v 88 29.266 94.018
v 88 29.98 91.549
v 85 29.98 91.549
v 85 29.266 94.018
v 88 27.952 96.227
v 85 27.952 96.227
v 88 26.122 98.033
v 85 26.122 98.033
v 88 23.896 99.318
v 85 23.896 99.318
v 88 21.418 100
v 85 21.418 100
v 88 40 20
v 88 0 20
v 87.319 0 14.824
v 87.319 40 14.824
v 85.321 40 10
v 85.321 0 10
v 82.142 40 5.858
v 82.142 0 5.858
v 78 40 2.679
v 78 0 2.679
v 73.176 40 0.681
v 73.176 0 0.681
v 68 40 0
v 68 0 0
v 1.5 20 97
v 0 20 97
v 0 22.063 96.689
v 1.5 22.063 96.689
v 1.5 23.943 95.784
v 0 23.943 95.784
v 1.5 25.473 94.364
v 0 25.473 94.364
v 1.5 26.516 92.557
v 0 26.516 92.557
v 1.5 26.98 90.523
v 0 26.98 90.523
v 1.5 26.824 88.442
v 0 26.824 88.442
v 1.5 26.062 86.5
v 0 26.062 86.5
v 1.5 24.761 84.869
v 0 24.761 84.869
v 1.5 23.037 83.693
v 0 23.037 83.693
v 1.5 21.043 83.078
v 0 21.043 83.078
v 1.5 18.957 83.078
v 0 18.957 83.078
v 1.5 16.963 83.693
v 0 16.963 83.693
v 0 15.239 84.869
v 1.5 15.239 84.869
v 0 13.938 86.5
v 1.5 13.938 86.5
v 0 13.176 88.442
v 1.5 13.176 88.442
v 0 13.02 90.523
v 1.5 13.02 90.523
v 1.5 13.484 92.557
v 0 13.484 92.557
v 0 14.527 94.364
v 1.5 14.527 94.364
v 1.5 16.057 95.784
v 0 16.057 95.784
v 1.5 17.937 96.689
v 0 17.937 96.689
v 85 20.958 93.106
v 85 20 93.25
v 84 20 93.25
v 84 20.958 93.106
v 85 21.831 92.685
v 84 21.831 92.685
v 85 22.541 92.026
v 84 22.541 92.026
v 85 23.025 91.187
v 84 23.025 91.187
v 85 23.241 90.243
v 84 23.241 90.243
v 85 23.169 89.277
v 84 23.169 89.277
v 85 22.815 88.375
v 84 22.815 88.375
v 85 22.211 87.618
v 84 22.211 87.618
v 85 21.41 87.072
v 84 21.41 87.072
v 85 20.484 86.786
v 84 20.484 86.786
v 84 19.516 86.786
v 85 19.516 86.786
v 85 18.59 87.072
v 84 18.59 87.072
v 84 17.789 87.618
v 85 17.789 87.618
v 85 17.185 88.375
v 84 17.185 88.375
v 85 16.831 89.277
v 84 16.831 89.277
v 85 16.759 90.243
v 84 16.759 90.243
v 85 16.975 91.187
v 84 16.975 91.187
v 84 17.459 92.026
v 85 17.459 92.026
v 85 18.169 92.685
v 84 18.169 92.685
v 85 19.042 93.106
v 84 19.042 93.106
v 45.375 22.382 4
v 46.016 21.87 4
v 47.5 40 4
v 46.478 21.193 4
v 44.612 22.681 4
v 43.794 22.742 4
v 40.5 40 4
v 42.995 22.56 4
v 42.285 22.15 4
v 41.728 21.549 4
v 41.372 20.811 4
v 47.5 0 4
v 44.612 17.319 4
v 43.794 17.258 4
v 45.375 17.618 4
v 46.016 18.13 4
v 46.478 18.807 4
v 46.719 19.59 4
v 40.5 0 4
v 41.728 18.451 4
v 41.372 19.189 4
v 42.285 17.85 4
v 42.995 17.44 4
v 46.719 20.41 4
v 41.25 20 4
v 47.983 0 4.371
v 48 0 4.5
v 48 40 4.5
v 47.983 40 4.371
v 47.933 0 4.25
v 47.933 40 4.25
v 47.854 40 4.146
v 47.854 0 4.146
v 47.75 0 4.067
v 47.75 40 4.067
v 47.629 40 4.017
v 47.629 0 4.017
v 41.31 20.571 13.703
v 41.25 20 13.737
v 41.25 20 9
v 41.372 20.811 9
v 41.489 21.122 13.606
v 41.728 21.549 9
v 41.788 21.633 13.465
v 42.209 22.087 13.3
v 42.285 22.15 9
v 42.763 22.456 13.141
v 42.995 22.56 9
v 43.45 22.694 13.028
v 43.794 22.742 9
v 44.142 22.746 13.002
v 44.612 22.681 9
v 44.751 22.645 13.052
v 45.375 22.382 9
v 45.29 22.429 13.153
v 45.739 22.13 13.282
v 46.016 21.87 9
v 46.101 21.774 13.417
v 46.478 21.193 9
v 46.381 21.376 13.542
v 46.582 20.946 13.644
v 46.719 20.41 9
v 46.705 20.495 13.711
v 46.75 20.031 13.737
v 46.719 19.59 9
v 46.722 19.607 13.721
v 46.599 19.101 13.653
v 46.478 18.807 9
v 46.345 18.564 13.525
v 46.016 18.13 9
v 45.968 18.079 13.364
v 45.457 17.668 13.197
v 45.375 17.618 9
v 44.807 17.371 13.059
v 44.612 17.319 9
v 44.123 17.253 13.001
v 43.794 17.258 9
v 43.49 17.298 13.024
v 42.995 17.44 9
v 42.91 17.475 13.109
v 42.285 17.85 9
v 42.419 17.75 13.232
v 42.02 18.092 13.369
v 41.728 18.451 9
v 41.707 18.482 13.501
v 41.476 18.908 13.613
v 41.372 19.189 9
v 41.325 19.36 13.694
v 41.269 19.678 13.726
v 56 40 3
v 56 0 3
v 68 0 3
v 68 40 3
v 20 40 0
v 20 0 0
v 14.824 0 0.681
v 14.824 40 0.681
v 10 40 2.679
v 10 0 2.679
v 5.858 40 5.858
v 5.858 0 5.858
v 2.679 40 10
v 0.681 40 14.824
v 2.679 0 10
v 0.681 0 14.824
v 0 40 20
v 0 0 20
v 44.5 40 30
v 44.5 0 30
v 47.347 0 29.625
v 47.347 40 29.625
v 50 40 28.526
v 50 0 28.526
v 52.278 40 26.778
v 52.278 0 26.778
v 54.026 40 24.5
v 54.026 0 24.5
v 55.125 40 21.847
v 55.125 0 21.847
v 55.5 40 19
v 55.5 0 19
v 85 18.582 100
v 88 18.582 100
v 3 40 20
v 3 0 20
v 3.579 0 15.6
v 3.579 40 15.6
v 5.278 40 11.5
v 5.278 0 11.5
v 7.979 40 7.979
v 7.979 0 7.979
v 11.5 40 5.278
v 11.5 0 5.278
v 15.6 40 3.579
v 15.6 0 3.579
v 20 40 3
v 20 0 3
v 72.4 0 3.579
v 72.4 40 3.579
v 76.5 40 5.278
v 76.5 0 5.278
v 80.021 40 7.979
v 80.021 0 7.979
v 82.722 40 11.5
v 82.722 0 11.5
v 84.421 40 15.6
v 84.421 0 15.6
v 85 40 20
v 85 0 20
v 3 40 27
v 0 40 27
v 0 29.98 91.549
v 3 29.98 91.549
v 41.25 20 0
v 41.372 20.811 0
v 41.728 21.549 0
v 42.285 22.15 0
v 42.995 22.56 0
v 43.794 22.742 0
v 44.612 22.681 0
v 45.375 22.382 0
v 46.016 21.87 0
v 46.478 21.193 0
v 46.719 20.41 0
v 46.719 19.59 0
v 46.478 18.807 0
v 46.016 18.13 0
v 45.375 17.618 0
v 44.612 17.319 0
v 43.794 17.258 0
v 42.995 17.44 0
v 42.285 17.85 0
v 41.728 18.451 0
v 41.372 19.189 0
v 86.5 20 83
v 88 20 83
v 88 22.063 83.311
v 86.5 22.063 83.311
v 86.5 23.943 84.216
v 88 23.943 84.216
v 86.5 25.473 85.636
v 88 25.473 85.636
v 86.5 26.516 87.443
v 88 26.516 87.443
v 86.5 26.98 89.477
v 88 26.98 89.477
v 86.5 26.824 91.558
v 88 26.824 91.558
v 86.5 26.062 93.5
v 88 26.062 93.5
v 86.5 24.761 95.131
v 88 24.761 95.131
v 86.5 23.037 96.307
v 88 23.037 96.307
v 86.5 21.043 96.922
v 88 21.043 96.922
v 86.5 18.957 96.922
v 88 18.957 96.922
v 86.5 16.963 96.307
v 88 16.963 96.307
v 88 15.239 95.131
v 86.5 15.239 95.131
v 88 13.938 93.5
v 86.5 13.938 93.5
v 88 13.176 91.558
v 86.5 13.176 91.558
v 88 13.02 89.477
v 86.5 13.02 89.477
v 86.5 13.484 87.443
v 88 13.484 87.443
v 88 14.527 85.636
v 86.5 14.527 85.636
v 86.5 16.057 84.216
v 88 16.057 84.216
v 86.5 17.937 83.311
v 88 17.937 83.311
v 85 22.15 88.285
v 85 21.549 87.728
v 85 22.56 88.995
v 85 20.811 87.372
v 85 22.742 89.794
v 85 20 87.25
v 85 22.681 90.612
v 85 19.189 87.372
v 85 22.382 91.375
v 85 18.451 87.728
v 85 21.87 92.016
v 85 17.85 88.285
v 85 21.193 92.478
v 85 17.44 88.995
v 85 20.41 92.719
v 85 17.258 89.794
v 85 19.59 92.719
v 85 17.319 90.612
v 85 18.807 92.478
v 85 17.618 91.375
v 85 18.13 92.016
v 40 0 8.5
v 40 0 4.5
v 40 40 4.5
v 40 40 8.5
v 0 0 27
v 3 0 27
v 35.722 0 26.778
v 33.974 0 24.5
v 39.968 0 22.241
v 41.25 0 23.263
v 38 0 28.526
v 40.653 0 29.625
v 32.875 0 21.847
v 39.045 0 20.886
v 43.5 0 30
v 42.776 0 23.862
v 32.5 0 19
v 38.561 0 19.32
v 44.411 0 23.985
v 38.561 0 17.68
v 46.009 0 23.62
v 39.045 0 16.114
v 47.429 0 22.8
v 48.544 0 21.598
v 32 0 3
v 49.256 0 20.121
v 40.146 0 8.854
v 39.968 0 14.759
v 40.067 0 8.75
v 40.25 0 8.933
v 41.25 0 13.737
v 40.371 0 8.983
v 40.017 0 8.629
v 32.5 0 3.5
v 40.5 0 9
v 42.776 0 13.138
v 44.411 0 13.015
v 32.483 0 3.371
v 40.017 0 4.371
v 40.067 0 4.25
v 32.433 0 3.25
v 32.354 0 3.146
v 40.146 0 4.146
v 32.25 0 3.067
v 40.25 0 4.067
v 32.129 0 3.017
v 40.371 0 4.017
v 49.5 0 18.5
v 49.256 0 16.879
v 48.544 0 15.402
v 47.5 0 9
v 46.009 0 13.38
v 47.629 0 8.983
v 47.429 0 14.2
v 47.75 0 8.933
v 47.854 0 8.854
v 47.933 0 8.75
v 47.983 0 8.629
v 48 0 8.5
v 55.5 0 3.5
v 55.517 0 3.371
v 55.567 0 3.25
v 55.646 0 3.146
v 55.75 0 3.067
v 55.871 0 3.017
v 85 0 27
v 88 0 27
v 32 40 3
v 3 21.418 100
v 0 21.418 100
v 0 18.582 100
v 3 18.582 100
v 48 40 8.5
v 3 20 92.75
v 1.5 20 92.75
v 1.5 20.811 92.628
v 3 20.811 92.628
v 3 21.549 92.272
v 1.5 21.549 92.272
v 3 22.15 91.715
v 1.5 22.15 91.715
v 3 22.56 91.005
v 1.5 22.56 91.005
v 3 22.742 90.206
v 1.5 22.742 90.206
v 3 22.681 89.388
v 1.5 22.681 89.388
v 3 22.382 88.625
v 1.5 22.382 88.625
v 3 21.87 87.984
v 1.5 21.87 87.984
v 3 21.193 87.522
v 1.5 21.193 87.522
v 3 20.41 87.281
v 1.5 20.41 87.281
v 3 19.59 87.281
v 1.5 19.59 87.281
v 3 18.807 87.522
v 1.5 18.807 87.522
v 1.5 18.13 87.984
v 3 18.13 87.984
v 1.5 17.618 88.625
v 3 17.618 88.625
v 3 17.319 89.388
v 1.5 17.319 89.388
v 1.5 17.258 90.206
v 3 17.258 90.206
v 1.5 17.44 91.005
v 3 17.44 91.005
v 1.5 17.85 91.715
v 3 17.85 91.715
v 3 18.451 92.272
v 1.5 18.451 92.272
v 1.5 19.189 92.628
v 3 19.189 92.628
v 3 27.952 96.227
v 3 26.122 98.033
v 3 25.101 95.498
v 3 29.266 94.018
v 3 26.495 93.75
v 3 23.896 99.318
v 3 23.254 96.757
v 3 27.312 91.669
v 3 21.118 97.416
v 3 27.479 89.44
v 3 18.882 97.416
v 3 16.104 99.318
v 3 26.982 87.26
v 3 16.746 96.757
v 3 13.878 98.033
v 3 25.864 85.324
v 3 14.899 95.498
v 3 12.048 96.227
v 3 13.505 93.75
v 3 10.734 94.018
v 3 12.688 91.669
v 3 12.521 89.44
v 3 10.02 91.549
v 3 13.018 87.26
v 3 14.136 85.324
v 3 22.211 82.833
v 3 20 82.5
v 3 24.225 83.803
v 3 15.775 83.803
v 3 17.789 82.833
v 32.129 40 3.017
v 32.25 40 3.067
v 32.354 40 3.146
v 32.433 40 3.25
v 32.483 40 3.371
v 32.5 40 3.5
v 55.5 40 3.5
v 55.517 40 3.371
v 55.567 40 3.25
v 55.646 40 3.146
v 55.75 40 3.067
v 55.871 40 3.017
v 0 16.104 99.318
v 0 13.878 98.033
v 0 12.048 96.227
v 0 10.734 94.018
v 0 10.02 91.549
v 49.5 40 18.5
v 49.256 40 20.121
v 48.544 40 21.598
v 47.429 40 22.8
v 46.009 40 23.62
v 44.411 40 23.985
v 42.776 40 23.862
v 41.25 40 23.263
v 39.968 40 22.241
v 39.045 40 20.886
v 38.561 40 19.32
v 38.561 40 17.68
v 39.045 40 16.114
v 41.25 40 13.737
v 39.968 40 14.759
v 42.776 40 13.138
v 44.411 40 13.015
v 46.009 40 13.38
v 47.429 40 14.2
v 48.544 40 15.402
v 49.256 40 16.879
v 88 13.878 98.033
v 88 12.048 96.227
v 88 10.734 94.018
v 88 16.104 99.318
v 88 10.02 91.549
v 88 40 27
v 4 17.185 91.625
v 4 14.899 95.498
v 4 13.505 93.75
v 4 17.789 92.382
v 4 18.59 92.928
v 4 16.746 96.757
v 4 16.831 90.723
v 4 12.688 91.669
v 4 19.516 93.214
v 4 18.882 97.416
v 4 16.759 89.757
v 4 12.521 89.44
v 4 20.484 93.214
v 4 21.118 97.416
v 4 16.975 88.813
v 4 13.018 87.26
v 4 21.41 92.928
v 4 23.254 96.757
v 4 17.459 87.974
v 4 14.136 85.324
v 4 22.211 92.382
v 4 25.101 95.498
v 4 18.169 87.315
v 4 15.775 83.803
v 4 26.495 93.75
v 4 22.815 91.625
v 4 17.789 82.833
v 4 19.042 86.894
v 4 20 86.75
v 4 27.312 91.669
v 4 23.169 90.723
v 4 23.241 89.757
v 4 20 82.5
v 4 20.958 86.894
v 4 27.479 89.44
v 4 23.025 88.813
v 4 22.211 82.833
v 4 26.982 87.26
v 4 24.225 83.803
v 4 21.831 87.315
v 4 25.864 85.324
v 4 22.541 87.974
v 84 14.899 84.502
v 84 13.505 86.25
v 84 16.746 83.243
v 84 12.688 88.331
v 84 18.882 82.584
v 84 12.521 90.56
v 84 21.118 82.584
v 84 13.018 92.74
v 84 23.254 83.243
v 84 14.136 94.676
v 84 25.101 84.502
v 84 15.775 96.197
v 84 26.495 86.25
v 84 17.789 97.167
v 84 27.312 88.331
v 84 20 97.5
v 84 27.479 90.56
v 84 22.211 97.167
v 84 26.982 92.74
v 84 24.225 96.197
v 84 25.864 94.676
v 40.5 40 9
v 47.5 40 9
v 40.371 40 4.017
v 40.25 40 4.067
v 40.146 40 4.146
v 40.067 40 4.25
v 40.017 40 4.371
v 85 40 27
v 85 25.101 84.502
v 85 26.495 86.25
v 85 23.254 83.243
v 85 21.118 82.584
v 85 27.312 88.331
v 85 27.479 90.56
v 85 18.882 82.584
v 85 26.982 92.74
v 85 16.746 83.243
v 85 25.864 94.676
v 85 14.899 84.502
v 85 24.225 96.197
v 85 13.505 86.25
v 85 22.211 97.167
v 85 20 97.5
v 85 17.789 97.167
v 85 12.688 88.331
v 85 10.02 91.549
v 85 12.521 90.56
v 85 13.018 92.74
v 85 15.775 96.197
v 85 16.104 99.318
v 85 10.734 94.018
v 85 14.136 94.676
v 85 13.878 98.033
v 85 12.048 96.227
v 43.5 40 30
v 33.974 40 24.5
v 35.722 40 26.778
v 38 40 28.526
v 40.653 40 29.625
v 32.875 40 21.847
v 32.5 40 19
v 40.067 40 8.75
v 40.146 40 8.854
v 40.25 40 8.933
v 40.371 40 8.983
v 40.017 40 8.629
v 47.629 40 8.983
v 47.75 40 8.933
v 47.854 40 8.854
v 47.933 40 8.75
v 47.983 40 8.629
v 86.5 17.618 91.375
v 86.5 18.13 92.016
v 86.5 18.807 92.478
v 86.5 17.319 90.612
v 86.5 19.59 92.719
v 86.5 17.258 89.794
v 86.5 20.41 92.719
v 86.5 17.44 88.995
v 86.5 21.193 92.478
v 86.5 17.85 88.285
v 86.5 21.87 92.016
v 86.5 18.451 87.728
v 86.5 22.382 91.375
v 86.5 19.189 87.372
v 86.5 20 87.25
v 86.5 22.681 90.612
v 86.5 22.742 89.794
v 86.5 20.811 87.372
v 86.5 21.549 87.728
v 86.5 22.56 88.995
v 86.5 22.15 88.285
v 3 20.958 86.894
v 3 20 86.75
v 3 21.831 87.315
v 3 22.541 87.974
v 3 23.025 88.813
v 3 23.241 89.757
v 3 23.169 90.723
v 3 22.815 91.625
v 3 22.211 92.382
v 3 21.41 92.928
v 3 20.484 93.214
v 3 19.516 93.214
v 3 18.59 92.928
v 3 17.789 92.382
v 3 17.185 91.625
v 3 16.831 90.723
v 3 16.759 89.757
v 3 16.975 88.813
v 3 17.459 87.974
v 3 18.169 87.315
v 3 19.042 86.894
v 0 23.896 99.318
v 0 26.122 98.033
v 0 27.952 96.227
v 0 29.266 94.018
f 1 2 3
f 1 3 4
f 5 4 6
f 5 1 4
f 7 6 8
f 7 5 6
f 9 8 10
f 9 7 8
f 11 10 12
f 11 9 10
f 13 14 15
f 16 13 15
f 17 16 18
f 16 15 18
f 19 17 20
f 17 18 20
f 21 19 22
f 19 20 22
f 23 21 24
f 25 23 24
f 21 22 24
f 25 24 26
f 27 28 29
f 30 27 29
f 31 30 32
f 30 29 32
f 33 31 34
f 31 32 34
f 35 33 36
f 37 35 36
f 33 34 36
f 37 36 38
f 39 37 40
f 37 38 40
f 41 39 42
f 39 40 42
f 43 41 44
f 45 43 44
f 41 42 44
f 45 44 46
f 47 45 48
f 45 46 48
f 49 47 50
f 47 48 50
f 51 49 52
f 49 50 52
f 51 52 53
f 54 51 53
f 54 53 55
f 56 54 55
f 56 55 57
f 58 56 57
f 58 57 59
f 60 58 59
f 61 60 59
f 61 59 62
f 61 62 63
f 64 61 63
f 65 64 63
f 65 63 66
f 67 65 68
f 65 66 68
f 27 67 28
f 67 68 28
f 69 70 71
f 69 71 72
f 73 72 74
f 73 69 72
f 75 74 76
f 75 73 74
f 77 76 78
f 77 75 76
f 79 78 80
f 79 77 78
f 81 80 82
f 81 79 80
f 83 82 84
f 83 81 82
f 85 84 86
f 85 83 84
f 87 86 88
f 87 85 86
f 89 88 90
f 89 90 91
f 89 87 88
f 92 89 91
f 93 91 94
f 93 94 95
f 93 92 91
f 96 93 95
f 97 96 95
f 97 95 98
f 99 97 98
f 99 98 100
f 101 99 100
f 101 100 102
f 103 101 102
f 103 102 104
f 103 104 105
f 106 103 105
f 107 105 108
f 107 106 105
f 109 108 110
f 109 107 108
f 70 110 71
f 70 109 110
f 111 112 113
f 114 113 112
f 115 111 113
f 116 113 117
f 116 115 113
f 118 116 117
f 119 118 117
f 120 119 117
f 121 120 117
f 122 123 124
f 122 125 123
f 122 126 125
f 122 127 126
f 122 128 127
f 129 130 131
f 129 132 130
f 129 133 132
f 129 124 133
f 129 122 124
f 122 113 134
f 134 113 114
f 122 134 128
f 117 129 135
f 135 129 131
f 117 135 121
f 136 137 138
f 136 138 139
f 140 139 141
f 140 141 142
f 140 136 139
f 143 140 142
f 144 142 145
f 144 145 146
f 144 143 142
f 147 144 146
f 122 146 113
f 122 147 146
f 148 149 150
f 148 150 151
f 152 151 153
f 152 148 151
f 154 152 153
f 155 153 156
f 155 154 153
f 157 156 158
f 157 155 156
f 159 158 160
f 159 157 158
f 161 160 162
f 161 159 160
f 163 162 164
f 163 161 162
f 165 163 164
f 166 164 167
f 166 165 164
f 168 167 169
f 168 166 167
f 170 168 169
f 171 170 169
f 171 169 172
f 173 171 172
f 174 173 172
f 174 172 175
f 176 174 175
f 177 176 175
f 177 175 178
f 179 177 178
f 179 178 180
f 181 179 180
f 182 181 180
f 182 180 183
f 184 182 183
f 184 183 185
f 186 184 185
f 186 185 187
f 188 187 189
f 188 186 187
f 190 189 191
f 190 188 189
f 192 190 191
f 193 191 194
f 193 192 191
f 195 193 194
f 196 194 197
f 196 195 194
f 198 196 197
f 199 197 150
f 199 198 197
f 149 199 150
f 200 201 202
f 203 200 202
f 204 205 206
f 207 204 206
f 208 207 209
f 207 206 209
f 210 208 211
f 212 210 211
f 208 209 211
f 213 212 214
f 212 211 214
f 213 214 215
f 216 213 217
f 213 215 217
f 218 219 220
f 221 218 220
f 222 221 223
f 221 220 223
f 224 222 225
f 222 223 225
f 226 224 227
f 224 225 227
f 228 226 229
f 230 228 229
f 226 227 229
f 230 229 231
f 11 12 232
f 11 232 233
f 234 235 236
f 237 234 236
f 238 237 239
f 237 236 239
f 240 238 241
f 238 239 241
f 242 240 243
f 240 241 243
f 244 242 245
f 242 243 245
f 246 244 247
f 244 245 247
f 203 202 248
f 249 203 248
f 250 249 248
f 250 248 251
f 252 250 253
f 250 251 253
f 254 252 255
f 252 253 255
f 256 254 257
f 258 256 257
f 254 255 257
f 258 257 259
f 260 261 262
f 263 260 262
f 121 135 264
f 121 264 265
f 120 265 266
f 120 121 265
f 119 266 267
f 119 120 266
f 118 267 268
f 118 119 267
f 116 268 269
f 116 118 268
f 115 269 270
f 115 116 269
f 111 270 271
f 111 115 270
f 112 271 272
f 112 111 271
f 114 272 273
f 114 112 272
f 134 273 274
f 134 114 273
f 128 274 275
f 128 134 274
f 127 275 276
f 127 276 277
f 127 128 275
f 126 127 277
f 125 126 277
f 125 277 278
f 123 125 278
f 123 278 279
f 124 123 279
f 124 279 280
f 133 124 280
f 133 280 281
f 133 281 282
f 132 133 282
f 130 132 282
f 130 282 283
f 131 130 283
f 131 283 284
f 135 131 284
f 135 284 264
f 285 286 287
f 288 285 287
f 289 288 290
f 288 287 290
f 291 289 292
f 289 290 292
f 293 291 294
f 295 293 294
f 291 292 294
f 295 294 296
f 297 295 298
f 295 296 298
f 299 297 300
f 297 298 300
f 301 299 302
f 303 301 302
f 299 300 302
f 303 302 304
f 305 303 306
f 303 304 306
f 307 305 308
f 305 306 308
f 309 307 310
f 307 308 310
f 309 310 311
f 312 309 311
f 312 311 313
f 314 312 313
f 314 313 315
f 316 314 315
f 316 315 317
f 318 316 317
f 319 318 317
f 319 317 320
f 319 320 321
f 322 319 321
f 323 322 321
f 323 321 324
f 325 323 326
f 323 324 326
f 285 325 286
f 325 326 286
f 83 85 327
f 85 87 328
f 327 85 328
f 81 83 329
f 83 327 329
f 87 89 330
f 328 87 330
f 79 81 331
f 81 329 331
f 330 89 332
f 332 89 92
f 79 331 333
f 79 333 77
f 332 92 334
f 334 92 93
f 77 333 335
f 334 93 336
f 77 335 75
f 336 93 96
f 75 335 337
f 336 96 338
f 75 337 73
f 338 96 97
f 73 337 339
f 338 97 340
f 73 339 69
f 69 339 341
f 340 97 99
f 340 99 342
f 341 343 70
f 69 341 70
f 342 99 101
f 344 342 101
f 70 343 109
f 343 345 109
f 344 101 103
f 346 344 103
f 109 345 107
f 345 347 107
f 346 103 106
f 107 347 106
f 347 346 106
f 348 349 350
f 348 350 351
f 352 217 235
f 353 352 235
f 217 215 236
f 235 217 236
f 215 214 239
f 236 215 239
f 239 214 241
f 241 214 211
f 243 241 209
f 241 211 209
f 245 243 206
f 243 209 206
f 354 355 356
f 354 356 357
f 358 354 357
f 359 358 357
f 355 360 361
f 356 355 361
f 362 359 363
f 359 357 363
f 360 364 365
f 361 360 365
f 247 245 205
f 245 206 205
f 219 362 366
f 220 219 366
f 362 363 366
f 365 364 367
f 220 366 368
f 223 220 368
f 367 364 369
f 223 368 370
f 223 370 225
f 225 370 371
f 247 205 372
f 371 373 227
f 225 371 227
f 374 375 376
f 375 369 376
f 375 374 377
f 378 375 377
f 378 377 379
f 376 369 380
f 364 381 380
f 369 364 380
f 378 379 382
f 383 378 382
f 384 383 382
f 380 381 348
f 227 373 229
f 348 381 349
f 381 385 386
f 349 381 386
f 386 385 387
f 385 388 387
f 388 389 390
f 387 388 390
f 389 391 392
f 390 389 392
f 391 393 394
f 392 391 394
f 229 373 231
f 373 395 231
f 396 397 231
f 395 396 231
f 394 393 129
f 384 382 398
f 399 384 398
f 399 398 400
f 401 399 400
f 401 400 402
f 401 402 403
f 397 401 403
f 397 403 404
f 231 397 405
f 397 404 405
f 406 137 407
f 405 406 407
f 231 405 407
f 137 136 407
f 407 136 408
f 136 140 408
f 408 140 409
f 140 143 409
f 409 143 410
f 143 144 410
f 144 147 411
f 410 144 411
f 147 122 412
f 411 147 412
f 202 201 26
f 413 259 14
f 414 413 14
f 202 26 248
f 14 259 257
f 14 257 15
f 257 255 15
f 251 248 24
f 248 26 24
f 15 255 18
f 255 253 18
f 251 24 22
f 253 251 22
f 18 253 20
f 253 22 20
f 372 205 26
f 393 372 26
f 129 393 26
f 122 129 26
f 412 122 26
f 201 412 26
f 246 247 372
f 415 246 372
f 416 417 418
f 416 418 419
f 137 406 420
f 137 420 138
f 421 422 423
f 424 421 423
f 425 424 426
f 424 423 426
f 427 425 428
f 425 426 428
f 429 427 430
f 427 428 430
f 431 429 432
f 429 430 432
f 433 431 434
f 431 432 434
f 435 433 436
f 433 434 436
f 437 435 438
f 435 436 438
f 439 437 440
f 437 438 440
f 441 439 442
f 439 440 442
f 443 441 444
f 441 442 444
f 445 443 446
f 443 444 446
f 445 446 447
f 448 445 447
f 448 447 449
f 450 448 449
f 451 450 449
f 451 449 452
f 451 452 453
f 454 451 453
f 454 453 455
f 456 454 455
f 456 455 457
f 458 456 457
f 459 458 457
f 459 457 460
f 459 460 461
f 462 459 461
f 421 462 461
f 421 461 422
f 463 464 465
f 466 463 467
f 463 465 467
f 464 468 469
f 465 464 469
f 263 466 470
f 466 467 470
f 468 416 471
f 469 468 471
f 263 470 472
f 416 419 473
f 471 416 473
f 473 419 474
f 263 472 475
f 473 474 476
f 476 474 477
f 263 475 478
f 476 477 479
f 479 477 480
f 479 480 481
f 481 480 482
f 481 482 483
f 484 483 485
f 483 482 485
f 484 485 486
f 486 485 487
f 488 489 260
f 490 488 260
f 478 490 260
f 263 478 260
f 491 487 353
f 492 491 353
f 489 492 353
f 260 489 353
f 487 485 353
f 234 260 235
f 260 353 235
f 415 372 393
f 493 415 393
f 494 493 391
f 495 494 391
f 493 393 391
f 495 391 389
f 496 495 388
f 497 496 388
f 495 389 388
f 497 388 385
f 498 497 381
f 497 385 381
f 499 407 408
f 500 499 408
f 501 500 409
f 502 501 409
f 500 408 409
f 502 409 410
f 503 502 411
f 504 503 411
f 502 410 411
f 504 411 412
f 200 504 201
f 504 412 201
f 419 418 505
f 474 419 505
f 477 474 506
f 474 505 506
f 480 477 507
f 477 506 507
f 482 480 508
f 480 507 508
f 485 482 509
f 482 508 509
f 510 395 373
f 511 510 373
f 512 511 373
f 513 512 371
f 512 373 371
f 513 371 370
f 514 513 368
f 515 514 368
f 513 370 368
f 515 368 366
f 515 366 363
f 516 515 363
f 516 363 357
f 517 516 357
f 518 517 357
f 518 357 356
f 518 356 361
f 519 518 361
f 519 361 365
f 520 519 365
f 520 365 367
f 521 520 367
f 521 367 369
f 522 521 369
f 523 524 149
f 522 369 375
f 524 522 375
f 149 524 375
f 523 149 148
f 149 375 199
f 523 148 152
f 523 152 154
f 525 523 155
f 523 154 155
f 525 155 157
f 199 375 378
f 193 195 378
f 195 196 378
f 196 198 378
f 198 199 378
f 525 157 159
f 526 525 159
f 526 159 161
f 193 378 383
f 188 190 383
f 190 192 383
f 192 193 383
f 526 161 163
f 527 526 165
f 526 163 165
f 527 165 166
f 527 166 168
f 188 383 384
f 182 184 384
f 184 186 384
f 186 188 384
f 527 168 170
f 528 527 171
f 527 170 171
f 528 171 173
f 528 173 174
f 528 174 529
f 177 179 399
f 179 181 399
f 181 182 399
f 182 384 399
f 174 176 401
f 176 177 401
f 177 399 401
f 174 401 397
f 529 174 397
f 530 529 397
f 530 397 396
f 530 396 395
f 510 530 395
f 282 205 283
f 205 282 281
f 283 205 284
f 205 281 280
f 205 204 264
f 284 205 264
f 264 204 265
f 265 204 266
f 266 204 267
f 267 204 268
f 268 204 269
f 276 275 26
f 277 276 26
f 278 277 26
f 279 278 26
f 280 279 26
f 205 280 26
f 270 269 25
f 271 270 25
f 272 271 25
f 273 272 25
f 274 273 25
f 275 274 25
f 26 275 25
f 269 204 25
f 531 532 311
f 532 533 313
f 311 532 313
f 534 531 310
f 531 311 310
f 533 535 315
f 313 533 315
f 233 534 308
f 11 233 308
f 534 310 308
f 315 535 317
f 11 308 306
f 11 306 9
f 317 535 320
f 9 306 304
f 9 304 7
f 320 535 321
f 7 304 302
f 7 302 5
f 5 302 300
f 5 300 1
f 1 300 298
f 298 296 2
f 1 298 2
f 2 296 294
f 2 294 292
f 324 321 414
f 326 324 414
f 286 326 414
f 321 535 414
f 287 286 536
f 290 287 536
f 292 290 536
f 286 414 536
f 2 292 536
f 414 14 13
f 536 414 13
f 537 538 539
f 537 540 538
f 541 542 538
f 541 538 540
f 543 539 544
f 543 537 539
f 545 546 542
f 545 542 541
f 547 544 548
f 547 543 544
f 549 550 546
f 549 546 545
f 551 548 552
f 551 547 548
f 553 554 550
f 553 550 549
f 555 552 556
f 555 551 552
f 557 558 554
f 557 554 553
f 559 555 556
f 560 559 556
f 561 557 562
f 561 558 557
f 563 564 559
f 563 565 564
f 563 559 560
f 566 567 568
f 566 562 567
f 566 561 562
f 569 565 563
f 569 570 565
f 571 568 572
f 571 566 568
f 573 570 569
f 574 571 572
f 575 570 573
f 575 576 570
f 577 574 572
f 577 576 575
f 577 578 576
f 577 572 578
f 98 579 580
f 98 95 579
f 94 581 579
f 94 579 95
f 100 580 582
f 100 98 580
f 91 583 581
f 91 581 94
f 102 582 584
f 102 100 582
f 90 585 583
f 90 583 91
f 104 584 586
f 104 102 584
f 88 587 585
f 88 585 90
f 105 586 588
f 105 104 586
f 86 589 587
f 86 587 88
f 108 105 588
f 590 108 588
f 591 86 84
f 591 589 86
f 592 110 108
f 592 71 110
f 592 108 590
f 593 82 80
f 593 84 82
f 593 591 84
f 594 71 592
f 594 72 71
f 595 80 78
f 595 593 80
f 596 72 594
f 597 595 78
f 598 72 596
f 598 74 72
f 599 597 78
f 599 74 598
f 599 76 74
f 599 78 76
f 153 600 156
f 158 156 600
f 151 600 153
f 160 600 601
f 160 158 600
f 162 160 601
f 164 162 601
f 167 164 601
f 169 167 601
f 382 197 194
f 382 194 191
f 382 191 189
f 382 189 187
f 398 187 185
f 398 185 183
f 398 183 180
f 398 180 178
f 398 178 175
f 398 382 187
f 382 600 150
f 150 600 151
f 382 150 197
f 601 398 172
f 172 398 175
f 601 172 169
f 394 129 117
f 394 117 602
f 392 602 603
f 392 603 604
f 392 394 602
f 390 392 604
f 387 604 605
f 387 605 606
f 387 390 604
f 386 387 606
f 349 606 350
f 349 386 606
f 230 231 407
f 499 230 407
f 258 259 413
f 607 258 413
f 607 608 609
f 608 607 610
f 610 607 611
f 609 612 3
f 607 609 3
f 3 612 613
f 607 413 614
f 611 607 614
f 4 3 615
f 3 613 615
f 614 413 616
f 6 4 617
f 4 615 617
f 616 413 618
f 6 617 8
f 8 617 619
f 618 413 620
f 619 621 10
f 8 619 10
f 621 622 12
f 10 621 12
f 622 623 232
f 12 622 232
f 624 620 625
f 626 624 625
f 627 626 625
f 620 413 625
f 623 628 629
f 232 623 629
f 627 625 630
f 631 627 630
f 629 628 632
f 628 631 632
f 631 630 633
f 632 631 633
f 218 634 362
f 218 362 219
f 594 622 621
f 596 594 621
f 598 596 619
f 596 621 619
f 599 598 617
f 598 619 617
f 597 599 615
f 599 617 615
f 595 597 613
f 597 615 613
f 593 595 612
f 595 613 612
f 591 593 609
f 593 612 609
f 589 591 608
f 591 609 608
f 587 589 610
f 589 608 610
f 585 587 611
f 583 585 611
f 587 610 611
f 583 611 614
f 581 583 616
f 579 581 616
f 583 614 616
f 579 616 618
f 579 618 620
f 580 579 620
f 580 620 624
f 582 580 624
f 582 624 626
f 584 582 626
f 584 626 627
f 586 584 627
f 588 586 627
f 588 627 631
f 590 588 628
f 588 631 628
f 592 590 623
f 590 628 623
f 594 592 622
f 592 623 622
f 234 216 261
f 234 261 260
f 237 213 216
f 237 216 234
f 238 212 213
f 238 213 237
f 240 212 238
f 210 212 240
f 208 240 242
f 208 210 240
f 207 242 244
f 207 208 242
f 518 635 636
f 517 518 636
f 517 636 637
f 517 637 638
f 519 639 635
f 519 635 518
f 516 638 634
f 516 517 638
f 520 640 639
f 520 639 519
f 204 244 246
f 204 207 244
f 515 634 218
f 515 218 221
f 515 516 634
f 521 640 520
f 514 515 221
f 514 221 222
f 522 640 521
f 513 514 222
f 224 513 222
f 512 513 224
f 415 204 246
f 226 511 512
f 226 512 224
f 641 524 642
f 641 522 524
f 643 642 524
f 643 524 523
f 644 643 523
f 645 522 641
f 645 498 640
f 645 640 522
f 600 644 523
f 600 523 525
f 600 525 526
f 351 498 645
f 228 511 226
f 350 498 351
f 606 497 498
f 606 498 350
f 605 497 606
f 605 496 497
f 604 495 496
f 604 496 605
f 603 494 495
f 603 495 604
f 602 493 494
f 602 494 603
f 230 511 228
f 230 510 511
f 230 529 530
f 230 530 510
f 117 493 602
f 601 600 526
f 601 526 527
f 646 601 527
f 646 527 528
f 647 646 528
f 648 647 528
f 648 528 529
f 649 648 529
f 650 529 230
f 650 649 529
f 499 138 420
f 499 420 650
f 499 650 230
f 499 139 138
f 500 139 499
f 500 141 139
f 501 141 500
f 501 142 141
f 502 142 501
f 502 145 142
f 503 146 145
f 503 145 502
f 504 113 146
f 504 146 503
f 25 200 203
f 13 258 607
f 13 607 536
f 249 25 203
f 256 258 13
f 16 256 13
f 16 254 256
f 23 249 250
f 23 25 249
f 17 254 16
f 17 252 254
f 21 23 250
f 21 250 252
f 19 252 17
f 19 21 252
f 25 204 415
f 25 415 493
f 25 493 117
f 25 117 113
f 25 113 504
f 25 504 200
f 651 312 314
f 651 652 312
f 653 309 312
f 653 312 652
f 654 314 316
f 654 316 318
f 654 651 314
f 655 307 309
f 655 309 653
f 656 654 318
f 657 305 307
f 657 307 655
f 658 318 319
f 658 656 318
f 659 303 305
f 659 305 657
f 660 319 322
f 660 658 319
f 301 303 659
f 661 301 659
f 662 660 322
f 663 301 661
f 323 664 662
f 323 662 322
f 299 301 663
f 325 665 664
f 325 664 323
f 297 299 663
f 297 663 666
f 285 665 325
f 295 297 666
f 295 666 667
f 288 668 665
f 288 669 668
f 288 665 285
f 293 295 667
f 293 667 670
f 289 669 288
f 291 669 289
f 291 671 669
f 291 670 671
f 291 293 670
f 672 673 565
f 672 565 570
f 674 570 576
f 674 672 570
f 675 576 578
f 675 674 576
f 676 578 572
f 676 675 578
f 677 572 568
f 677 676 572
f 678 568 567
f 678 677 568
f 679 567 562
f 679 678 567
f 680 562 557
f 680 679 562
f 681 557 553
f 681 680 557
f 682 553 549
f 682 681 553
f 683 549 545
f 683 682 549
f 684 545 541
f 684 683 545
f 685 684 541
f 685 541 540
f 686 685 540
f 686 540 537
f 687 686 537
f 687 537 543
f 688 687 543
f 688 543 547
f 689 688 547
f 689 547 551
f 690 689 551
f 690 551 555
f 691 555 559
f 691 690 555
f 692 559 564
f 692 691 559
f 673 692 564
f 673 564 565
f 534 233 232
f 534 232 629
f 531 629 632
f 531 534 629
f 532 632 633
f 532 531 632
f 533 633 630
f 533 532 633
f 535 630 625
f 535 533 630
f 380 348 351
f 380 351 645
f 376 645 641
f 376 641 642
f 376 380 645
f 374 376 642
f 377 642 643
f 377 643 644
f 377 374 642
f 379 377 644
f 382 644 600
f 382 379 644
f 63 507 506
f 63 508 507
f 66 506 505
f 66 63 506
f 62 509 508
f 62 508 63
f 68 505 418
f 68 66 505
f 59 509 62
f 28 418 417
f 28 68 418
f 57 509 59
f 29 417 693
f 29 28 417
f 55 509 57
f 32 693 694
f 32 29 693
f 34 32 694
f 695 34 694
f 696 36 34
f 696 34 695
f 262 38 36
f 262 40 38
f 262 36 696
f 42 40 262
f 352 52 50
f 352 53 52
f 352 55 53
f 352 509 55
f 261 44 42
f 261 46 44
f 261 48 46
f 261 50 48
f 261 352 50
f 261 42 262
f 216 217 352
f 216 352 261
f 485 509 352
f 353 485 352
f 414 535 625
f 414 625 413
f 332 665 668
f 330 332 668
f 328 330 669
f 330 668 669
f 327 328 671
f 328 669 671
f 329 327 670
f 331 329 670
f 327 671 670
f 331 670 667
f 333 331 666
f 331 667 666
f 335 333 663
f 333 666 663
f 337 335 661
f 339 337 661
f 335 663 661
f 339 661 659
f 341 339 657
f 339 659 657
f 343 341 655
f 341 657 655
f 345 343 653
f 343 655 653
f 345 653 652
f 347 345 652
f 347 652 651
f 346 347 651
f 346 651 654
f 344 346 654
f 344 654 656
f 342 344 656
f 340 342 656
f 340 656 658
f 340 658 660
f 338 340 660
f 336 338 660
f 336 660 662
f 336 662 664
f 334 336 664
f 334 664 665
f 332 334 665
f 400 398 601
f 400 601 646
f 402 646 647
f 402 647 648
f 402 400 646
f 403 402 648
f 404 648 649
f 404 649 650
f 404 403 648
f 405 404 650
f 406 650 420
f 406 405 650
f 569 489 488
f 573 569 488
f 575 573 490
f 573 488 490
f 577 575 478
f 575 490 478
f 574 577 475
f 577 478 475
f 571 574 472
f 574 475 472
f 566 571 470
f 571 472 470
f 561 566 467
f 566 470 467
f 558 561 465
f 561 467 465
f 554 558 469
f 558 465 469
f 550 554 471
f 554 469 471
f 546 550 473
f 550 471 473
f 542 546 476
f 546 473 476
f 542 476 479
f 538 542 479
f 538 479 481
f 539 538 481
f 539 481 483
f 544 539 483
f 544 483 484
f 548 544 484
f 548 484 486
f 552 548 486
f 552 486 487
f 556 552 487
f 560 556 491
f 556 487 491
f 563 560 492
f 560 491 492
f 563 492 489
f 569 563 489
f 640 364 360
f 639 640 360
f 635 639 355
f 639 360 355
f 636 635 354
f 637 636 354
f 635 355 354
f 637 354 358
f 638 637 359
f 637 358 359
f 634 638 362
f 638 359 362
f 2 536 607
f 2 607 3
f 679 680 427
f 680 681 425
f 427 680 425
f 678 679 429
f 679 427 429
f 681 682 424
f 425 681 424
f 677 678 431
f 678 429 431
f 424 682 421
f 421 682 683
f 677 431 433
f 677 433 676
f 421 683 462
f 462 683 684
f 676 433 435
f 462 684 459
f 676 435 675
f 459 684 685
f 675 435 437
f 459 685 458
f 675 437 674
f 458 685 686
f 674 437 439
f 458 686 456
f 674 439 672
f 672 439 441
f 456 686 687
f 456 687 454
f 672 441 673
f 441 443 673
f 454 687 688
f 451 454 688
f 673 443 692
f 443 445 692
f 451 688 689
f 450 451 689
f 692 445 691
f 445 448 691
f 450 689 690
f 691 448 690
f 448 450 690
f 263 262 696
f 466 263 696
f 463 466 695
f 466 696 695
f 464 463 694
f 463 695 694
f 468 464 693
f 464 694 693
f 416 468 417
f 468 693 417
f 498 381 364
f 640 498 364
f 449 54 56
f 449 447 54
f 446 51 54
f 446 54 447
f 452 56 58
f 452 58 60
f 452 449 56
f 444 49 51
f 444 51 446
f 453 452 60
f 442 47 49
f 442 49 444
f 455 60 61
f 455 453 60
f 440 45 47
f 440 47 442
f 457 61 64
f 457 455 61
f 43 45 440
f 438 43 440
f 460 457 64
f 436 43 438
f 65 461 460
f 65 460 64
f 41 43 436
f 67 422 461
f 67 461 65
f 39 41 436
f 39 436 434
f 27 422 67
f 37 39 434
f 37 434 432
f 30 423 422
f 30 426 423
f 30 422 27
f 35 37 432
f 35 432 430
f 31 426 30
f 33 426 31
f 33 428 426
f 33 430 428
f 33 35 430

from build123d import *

# Parameters (mm, degrees)
SKETCH1_W           = 88
SKETCH1_H           = 40
BOSS_EXTRUDE1_DEPTH = 100
SKETCH2_R           = 5.5
CUT_EXTRUDE1_DEPTH  = 40
CUT_EXTRUDE2_START  = -13.73686
SKETCH3_R           = 2.75
CUT_EXTRUDE2_DEPTH  = 13.73686
SKETCH5_R           = 2.75
CUT_EXTRUDE3_DEPTH  = 3
SKETCH6_R           = 2.75
CUT_EXTRUDE4_DEPTH  = 3
SKETCH7_R           = 7.5
SKETCH7_R_2         = 3.25
BOSS_EXTRUDE2_DEPTH = 1
SKETCH8_R           = 7.5
SKETCH8_R_2         = 3.25
BOSS_EXTRUDE3_DEPTH = 1
SKETCH9_R           = 7
CUT_EXTRUDE5_DEPTH  = 1.5
SKETCH10_R          = 7
CUT_EXTRUDE6_DEPTH  = 1.5


with BuildPart() as part:
    # Sketch1 → Boss-Extrude1 (new body)
    with BuildSketch(Plane.XY):
        with Locations((44, 20)):
            Rectangle(SKETCH1_W, SKETCH1_H)
    extrude(amount=BOSS_EXTRUDE1_DEPTH)

    # Sketch2 → Cut-Extrude1 (cut)
    with BuildSketch(Plane.XZ):
        with Locations((44, 18.5)):
            Circle(SKETCH2_R)
        with BuildLine():
            Line((20, 3), (32, 3))
            ThreePointArc((32, 3), (32.353553391, 3.146446609), (32.5, 3.5))
            Line((32.5, 3.5), (32.5, 19))
            ThreePointArc((32.5, 19), (35.721825407, 26.778174593), (43.5, 30))
            Line((43.5, 30), (44.5, 30))
            ThreePointArc((44.5, 30), (52.278174593, 26.778174593), (55.5, 19))
            Line((55.5, 19), (55.5, 3.5))
            ThreePointArc((55.5, 3.5), (55.646446609, 3.146446609), (56, 3))
            Line((56, 3), (68, 3))
            ThreePointArc((68, 3), (80.02081528, 7.97918472), (85, 20))
            Line((85, 20), (85, 100))
            Line((85, 100), (3, 100))
            Line((3, 100), (3, 20))
            ThreePointArc((3, 20), (7.97918472, 7.97918472), (20, 3))
        make_face()
        with BuildLine():
            Line((0, 20), (0, 0))
            Line((0, 0), (20, 0))
            ThreePointArc((20, 0), (5.857864376, 5.857864376), (0, 20))
        make_face()
        with BuildLine():
            Line((68, 0), (88, 0))
            Line((88, 0), (88, 20))
            ThreePointArc((88, 20), (82.142135624, 5.857864376), (68, 0))
        make_face()
        with BuildLine():
            Line((40.5, 9), (47.5, 9))
            ThreePointArc((47.5, 9), (47.853553391, 8.853553391), (48, 8.5))
            Line((48, 8.5), (48, 4.5))
            ThreePointArc((48, 4.5), (47.853553391, 4.146446609), (47.5, 4))
            Line((47.5, 4), (40.5, 4))
            ThreePointArc((40.5, 4), (40.146446609, 4.146446609), (40, 4.5))
            Line((40, 4.5), (40, 8.5))
            ThreePointArc((40, 8.5), (40.146446609, 8.853553391), (40.5, 9))
        make_face()
    extrude(amount=-CUT_EXTRUDE1_DEPTH, mode=Mode.SUBTRACT)

    # Sketch3 → Cut-Extrude2 (cut)
    with BuildSketch(Plane(origin=(0, 0, 0), x_dir=(-1, 0, 0), z_dir=(0, 0, -1)).offset(CUT_EXTRUDE2_START)):
        with Locations((-44, 20)):
            Circle(SKETCH3_R)
    extrude(amount=CUT_EXTRUDE2_DEPTH, mode=Mode.SUBTRACT)

    # Sketch5 → Cut-Extrude3 (cut)
    with BuildSketch(Plane(origin=(88, 0, 0), x_dir=(0, 0, -1), z_dir=(1, 0, 0))):
        with Locations((-90, 20)):
            Circle(SKETCH5_R)
        with BuildLine():
            Line((-27, 0), (-100, 0))
            Line((-100, 0), (-100, 18.582255312))
            ThreePointArc((-100, 18.582255312), (-97.188609996, 12.905362143), (-91.549199975, 10.01952008))
            Line((-91.549199975, 10.01952008), (-27, 0))
        make_face()
        with BuildLine():
            Line((-100, 40), (-27, 40))
            Line((-27, 40), (-91.549199975, 29.98047992))
            ThreePointArc((-91.549199975, 29.98047992), (-97.188609996, 27.094637857), (-100, 21.417744688))
            Line((-100, 21.417744688), (-100, 40))
        make_face()
    extrude(amount=-CUT_EXTRUDE3_DEPTH, mode=Mode.SUBTRACT)

    # Sketch6 → Cut-Extrude4 (cut)
    with BuildSketch(Plane.ZY):
        with Locations((90, 20)):
            Circle(SKETCH6_R)
        with BuildLine():
            Line((100, 0), (100, 18.582255312))
            ThreePointArc((100, 18.582255312), (97.188609996, 12.905362143), (91.549199975, 10.01952008))
            Line((91.549199975, 10.01952008), (27, 0))
            Line((27, 0), (100, 0))
        make_face()
        with BuildLine():
            Line((100, 21.417744688), (100, 40))
            Line((100, 40), (27, 40))
            Line((27, 40), (91.549199975, 29.98047992))
            ThreePointArc((91.549199975, 29.98047992), (97.188609996, 27.094637857), (100, 21.417744688))
        make_face()
    extrude(amount=-CUT_EXTRUDE4_DEPTH, mode=Mode.SUBTRACT)

    # Sketch7 → Boss-Extrude2 (add)
    with BuildSketch(Plane(origin=(3, 0, 0), x_dir=(0, 0, -1), z_dir=(1, 0, 0))):
        with Locations((-90, 20)):
            Circle(SKETCH7_R)
        with Locations((-90, 20)):
            Circle(SKETCH7_R_2, mode=Mode.SUBTRACT)
    extrude(amount=BOSS_EXTRUDE2_DEPTH)

    # Sketch8 → Boss-Extrude3 (add)
    with BuildSketch(Plane.ZY.offset(-85)):
        with Locations((90, 20)):
            Circle(SKETCH8_R)
        with Locations((90, 20)):
            Circle(SKETCH8_R_2, mode=Mode.SUBTRACT)
    extrude(amount=BOSS_EXTRUDE3_DEPTH)

    # Sketch9 → Cut-Extrude5 (cut)
    with BuildSketch(Plane(origin=(88, 0, 0), x_dir=(0, 0, -1), z_dir=(1, 0, 0))):
        with Locations((-90, 20)):
            Circle(SKETCH9_R)
    extrude(amount=-CUT_EXTRUDE5_DEPTH, mode=Mode.SUBTRACT)

    # Sketch10 → Cut-Extrude6 (cut)
    with BuildSketch(Plane.ZY):
        with Locations((90, 20)):
            Circle(SKETCH10_R)
    extrude(amount=-CUT_EXTRUDE6_DEPTH, mode=Mode.SUBTRACT)


solid = part.part
